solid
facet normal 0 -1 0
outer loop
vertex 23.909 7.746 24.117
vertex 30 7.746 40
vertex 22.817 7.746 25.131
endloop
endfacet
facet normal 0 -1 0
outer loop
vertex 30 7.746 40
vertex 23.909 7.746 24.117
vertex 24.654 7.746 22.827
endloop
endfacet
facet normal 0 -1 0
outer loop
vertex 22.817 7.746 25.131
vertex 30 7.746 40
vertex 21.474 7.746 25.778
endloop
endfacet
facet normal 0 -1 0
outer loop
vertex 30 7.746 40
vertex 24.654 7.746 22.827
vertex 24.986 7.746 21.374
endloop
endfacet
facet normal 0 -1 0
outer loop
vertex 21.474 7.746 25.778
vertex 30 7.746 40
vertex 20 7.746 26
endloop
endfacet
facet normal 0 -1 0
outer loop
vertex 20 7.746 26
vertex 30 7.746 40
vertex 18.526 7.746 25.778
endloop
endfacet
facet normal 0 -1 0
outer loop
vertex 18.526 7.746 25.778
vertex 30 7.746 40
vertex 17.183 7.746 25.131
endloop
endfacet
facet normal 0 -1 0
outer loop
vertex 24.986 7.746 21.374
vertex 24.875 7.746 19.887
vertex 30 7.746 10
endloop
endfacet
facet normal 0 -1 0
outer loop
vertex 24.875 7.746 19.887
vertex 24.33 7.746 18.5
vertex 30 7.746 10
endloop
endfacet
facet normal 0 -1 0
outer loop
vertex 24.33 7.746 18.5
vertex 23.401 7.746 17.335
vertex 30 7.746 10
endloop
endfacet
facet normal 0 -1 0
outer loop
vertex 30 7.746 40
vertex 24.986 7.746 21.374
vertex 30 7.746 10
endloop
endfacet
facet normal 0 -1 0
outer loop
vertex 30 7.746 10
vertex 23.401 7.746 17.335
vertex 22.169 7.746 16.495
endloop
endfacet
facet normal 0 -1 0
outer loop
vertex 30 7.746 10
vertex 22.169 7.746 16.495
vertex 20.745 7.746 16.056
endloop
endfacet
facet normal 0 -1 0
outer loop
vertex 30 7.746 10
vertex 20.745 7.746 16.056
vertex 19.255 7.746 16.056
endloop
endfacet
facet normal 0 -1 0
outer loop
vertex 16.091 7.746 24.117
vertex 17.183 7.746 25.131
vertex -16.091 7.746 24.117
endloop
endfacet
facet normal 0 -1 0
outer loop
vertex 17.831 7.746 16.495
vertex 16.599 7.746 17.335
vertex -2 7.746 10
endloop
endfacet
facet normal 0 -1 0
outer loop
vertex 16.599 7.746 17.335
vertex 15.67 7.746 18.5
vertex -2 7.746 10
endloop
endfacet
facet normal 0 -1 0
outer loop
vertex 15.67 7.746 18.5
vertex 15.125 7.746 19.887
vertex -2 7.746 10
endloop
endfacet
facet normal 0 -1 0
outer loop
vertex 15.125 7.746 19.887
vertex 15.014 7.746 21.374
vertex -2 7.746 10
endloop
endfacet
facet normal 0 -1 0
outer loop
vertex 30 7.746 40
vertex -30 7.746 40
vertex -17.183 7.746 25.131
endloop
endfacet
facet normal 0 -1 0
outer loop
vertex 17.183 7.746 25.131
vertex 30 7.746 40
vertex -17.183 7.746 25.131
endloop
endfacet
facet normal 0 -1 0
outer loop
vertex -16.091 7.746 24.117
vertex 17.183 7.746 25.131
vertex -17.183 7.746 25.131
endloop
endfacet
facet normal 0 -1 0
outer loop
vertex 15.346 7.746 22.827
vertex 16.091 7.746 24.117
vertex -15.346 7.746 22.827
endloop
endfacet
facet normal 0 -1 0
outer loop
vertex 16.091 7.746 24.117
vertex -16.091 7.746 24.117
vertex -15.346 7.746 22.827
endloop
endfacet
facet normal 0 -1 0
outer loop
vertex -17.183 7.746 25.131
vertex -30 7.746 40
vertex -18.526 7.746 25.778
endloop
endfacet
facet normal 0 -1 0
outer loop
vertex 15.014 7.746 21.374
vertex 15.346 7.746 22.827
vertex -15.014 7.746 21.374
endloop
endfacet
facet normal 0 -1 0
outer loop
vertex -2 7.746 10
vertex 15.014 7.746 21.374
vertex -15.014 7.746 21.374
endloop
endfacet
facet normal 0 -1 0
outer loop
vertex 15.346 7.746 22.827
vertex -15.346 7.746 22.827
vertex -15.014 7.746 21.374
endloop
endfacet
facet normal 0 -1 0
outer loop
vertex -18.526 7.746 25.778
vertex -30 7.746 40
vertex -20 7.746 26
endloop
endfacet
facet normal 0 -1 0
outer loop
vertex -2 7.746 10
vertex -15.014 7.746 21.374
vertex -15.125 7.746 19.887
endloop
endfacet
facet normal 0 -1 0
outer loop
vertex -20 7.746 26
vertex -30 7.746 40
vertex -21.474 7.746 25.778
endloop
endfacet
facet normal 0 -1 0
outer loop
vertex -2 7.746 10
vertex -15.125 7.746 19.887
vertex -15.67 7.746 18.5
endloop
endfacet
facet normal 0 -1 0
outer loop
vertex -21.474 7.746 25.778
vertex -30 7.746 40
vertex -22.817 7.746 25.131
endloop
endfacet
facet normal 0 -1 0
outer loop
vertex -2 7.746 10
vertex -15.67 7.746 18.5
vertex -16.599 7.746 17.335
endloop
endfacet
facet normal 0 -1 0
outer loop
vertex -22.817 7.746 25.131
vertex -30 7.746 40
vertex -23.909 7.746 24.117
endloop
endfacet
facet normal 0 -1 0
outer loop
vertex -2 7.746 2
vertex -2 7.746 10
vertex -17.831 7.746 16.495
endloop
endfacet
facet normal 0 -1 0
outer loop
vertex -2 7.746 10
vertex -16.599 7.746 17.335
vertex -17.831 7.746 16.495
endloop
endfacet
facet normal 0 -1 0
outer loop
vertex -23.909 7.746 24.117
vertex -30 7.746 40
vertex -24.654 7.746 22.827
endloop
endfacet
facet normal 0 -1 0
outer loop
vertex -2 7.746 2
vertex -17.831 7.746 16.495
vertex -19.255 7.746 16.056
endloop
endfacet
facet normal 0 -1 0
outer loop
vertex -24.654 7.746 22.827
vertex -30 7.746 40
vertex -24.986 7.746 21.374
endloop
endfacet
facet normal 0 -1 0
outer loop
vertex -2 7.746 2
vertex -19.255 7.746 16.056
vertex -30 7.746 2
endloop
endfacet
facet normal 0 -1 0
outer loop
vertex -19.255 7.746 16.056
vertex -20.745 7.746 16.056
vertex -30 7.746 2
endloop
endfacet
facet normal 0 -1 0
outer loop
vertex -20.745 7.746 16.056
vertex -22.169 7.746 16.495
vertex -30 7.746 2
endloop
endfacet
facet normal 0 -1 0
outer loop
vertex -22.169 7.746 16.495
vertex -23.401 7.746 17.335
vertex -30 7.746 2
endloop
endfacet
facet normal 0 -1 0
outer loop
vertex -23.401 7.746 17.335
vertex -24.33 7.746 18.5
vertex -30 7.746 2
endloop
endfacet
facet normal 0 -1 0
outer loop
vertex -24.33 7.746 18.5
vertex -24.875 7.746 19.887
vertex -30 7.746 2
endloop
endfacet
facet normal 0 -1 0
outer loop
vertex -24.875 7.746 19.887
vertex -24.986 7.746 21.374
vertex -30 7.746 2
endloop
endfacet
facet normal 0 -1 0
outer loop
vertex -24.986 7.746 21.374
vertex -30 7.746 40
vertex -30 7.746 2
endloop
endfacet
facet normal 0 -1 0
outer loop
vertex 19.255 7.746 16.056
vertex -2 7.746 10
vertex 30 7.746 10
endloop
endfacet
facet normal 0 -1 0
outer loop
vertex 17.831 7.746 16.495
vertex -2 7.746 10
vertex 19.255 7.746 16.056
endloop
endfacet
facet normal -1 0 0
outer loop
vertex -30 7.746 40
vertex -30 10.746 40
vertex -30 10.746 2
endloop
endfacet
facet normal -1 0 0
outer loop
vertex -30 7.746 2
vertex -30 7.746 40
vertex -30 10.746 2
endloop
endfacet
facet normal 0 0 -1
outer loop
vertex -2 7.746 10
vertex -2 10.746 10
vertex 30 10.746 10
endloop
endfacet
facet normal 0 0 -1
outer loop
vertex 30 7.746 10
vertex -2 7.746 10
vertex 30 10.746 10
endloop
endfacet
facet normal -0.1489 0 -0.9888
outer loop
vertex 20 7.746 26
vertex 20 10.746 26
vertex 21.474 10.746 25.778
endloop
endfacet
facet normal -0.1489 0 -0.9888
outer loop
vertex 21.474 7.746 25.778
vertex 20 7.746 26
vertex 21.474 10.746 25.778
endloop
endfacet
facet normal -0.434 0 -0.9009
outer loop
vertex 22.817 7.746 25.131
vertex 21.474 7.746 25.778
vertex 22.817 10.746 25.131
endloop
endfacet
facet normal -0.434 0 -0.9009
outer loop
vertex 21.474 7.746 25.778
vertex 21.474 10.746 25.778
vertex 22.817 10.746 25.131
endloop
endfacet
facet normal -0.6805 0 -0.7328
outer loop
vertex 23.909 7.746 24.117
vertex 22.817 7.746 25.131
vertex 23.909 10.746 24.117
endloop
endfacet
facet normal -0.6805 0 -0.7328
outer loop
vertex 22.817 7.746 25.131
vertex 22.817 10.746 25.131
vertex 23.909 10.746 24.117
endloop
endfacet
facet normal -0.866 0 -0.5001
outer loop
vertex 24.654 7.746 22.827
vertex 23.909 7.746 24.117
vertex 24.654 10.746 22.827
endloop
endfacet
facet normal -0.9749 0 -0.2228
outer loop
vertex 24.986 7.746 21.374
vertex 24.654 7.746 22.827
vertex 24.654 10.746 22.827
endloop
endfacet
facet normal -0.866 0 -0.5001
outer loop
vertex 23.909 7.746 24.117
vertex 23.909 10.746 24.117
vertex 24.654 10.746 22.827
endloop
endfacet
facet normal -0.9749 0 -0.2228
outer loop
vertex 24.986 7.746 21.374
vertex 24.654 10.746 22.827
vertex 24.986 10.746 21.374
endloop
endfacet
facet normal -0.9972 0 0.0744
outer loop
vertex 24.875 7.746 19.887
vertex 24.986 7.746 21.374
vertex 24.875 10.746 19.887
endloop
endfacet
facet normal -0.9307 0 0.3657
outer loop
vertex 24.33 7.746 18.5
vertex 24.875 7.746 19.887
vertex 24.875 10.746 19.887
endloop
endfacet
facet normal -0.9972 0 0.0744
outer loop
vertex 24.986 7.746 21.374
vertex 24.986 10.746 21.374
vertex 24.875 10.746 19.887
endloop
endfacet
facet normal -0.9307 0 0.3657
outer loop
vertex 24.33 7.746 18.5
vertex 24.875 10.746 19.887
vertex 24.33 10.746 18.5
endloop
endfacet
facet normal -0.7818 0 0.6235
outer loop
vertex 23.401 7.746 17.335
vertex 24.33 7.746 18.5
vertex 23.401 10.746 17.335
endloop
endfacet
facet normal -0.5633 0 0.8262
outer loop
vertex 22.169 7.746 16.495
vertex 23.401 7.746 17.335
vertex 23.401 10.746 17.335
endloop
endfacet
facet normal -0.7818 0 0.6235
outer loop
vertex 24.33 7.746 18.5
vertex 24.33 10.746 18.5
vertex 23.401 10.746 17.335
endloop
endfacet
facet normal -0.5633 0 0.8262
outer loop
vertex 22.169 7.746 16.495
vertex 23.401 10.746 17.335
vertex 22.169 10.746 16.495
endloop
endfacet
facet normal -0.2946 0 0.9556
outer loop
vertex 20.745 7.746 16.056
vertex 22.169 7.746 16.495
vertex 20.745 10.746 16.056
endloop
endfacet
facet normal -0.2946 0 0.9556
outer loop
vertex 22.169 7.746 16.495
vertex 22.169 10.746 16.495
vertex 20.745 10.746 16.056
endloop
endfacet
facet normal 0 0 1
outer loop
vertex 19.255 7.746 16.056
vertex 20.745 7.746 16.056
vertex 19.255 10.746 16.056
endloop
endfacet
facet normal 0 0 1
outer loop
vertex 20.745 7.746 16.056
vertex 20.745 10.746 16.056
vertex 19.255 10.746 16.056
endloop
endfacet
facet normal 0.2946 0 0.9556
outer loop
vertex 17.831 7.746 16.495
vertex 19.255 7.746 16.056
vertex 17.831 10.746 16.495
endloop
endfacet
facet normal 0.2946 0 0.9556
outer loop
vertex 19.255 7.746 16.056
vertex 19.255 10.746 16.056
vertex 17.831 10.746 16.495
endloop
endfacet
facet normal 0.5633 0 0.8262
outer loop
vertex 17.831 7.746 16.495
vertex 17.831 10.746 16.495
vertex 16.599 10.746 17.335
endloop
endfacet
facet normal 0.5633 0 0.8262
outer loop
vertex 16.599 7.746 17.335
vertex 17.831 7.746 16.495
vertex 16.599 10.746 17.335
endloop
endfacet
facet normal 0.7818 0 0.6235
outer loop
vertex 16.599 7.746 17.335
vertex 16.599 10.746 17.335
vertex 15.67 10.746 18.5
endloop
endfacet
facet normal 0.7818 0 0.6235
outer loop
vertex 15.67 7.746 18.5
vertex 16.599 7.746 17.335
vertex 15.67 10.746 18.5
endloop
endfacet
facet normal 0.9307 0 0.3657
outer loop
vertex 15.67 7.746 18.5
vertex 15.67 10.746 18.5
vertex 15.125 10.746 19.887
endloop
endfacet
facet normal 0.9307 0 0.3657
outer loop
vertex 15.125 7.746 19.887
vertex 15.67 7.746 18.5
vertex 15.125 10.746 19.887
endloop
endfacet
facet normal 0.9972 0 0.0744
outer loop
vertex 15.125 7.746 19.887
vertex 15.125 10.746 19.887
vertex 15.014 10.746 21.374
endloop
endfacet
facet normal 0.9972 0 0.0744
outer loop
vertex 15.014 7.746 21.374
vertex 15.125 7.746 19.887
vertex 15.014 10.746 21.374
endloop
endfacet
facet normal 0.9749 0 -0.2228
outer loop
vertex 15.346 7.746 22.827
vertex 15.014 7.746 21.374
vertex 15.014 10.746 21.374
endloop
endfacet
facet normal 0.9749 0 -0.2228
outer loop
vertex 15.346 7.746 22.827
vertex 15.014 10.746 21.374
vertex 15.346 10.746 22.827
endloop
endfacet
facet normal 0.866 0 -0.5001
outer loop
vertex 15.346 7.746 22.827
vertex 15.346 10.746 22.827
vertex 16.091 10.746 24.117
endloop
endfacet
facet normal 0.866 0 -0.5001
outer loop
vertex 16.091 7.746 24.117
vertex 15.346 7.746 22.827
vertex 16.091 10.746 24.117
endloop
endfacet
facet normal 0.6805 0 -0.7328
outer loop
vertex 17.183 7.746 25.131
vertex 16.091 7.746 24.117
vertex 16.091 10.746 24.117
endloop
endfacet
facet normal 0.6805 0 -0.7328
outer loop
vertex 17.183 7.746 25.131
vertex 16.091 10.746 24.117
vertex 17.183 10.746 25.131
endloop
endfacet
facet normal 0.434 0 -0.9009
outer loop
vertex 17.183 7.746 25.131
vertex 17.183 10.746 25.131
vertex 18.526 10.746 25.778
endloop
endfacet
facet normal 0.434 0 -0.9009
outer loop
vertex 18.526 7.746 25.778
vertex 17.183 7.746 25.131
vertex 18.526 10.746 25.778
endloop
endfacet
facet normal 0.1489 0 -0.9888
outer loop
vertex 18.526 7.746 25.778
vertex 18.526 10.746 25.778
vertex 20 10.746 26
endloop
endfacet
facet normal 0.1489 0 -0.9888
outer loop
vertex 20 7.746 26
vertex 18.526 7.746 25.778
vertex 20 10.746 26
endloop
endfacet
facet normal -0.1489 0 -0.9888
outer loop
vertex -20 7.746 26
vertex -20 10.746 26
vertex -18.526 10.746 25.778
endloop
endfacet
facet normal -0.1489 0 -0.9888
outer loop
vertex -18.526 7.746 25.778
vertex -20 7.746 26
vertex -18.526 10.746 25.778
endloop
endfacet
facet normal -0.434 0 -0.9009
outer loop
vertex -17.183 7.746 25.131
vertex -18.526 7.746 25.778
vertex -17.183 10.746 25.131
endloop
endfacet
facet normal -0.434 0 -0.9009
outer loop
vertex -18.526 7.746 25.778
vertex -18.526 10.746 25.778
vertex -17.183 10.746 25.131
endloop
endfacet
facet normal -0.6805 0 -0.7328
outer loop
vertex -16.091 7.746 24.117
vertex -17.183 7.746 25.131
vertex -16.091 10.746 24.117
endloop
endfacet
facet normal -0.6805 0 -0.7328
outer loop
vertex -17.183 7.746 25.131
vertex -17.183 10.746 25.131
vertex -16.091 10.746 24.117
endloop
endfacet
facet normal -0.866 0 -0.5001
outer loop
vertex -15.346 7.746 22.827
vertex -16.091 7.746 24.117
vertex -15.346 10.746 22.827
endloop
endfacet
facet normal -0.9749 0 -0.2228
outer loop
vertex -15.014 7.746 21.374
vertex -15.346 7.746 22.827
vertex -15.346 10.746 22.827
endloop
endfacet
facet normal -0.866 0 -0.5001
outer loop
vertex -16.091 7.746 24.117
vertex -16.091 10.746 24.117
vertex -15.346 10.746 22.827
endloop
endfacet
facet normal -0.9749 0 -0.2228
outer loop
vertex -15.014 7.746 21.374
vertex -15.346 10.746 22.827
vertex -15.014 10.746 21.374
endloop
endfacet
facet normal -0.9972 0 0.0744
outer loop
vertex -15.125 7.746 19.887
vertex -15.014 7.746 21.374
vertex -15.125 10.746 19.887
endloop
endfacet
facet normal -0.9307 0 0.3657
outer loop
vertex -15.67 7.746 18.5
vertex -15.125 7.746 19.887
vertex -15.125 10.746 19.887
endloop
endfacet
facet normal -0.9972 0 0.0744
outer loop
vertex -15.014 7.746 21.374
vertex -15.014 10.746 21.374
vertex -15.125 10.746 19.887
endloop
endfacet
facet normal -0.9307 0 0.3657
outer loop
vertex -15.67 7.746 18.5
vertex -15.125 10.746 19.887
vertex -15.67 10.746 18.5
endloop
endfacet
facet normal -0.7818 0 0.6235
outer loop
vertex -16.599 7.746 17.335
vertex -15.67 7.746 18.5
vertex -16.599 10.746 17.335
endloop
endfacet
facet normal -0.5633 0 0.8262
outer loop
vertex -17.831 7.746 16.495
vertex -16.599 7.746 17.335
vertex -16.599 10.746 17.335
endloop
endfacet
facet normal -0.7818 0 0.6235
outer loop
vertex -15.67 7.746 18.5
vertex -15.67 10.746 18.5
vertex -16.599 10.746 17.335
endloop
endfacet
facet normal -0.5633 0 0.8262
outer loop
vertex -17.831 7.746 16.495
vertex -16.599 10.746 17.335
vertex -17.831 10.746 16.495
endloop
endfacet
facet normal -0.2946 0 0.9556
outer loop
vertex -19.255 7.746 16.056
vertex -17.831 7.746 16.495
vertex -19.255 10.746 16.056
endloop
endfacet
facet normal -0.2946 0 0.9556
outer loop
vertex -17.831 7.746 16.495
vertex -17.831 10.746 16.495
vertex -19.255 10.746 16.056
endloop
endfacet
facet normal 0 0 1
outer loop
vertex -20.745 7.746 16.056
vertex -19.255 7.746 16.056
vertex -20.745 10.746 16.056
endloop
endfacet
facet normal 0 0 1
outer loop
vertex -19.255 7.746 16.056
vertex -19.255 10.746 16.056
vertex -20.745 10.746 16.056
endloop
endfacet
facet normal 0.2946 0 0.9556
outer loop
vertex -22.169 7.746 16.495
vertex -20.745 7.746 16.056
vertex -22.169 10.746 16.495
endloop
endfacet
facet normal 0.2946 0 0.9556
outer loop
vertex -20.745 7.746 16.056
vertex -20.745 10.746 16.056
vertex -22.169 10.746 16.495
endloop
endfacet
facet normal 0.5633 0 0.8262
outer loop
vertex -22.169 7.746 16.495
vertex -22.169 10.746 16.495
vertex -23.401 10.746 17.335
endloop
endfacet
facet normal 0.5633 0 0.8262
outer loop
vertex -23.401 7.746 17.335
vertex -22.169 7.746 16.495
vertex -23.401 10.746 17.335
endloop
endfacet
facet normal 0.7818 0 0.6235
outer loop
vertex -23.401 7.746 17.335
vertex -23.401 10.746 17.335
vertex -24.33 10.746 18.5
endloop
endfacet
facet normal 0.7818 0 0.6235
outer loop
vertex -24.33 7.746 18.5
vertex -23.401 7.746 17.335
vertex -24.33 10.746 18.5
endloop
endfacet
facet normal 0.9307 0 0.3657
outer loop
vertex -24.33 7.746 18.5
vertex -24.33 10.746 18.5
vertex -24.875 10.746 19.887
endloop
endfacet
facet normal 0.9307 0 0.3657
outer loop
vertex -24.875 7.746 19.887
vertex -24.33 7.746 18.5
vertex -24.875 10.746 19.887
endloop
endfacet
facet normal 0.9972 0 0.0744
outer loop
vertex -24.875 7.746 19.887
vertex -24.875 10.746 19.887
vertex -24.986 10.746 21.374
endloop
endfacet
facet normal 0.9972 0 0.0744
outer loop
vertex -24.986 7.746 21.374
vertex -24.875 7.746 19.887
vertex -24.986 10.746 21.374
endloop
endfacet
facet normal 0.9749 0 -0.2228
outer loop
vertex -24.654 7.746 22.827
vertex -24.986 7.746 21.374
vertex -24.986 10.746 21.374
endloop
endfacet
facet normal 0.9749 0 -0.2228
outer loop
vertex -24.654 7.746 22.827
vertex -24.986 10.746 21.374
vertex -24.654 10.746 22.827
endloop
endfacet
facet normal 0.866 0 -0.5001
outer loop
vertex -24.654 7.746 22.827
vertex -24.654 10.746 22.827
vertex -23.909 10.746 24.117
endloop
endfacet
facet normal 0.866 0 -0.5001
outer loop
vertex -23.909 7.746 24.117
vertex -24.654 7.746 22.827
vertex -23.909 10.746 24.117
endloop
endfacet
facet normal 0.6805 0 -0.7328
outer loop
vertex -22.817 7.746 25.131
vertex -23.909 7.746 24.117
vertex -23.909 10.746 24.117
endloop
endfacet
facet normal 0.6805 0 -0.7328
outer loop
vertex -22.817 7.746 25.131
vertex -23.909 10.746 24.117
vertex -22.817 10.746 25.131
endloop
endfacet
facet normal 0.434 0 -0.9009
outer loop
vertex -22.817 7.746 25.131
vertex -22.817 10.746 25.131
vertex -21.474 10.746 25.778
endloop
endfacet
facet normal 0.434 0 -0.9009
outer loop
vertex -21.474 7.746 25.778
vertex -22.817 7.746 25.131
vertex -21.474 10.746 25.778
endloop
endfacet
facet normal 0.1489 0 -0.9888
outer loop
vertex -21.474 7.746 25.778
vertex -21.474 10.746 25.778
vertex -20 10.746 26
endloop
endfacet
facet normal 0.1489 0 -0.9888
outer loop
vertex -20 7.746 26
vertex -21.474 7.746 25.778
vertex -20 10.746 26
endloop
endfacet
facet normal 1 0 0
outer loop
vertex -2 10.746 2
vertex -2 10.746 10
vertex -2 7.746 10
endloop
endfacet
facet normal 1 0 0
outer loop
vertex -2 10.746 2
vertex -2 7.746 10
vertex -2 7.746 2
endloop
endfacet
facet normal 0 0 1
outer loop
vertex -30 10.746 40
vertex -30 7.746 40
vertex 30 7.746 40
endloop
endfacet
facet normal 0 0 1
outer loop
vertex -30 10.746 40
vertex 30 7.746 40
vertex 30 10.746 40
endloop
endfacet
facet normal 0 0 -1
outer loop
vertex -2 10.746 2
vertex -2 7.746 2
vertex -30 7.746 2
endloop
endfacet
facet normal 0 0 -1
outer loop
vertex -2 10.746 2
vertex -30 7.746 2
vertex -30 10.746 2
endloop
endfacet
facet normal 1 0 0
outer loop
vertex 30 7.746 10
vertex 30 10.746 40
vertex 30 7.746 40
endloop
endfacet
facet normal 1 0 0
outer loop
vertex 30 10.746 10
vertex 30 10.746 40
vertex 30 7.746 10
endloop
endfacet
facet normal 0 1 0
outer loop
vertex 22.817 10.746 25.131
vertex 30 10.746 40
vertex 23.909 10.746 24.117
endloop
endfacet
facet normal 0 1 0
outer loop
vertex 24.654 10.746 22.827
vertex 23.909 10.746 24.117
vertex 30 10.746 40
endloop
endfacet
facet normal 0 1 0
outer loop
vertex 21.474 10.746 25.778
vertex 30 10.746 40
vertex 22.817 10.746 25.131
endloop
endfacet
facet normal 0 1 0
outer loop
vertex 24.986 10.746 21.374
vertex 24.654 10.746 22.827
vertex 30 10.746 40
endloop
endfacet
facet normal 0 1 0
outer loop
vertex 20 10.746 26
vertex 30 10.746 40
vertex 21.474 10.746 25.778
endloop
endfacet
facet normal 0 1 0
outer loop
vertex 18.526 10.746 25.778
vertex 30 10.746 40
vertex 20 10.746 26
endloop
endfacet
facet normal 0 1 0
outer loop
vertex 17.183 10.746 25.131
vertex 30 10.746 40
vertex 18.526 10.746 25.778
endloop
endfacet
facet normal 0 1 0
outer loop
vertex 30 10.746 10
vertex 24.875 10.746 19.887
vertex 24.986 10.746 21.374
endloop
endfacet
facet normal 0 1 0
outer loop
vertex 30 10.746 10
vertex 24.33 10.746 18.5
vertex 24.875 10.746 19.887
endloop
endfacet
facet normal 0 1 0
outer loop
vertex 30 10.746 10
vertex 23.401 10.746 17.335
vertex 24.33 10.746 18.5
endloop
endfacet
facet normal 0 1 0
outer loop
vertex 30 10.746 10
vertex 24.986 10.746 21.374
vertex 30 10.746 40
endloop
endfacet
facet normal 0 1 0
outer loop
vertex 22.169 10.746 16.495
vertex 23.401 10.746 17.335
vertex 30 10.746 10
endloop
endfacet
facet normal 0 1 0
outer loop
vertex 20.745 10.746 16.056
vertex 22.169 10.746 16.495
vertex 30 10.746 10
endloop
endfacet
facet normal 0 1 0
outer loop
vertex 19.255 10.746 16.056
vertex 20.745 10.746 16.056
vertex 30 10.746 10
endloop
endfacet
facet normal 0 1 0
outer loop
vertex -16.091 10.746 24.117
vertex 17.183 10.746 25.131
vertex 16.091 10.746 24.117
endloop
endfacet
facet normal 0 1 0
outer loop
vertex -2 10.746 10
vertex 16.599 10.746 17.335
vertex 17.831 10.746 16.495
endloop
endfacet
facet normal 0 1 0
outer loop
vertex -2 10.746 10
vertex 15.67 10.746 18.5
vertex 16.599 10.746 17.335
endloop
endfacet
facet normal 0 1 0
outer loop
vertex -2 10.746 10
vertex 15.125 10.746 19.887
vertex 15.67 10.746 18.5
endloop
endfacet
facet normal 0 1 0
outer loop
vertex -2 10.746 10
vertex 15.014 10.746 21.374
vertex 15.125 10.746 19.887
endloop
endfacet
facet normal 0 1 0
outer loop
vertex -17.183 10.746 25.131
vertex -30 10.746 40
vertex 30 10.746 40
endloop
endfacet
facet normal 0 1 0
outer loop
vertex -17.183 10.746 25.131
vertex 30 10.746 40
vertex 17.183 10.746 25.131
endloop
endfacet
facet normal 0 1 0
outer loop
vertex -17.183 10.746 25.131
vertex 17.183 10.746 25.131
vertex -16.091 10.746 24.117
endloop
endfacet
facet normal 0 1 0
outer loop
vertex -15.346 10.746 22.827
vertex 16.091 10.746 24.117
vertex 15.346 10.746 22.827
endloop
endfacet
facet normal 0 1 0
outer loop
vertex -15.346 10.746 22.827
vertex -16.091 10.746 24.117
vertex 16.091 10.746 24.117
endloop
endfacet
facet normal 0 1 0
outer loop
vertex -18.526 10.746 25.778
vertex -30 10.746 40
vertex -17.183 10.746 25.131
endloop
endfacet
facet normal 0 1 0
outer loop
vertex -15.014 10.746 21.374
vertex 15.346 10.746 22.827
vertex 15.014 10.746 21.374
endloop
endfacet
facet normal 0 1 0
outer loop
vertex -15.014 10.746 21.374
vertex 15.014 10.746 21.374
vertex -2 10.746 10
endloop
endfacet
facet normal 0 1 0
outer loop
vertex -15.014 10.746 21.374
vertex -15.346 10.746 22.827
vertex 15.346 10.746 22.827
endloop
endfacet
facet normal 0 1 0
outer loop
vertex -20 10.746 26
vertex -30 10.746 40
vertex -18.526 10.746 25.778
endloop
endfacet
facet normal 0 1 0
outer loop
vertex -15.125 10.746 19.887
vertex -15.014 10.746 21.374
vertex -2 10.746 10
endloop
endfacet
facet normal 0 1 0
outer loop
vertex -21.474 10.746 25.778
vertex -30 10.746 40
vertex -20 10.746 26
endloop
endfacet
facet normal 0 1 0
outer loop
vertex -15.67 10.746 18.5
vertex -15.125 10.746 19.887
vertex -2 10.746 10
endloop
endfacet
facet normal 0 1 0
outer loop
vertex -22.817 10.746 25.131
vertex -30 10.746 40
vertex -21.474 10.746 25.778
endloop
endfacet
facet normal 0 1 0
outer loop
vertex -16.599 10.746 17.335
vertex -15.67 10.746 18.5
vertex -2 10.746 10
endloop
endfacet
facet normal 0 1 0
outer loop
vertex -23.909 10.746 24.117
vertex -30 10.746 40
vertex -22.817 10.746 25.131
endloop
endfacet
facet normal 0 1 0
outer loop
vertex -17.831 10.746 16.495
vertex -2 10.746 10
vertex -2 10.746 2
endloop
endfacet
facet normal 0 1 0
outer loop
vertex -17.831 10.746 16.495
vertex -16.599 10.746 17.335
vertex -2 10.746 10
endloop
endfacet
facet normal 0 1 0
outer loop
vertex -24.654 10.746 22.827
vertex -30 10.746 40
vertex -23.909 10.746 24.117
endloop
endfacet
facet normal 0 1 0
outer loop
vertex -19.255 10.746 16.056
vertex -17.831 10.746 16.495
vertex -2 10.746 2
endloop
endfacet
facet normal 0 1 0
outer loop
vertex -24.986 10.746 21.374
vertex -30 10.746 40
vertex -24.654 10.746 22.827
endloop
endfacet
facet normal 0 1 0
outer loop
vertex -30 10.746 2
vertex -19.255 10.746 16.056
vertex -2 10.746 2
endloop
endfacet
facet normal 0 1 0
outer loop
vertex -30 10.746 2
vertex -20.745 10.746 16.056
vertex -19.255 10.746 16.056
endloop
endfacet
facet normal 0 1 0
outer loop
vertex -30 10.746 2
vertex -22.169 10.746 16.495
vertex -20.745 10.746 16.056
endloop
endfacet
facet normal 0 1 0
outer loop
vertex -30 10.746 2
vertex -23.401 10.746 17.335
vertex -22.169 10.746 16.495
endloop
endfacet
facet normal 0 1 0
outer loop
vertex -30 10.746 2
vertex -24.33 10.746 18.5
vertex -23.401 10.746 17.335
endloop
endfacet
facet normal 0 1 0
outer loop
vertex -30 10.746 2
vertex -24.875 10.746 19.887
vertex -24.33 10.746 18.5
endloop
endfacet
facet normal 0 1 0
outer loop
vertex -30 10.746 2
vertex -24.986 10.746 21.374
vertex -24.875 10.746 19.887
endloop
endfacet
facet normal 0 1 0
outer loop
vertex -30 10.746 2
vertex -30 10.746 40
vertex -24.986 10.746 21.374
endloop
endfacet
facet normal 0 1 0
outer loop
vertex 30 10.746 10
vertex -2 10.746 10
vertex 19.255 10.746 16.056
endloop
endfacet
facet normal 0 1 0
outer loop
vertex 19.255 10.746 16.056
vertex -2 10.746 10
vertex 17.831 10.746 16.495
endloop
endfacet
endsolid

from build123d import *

# Parameters (mm, degrees)
EXTRUDE_1_DEPTH      = 30
EXTRUDE_1_DEPTH_BACK = 30
SKETCH_1_W           = 38
SKETCH_1_H           = 3
SKETCH_2_R           = 5
SKETCH_2_W           = 32
SKETCH_2_H           = 8
CUT_EXTRUDE_1_DEPTH  = 51.089919145


with BuildPart() as part:
    # Эскиз1 → Бобышка-Вытянуть1 (new, two sides: drawn at the far end of the back side and taken through both)
    with BuildSketch(Plane(origin=(0, 0, 0), x_dir=(0, 0, -1), z_dir=(1, 0, 0)).offset(-EXTRUDE_1_DEPTH_BACK)):
        with Locations((-21, 9.245966692)):
            Rectangle(SKETCH_1_W, SKETCH_1_H)
    extrude(amount=EXTRUDE_1_DEPTH + EXTRUDE_1_DEPTH_BACK)

    # Эскиз2 → Вырез-Вытянуть1 (cut, through all)
    with BuildSketch(Plane(origin=(0, 10.745966692, 0), x_dir=(1, 0, 0), z_dir=(0, 1, 0))):
        with Locations(Location((-20, -21, 0), (0, 0, 270))):
            Circle(SKETCH_2_R)
        with Locations(Location((20, -21, 0), (0, 0, 270))):
            Circle(SKETCH_2_R)
        with Locations((14, -6)):
            Rectangle(SKETCH_2_W, SKETCH_2_H)
    extrude(amount=-CUT_EXTRUDE_1_DEPTH, mode=Mode.SUBTRACT)


solid = part.part
